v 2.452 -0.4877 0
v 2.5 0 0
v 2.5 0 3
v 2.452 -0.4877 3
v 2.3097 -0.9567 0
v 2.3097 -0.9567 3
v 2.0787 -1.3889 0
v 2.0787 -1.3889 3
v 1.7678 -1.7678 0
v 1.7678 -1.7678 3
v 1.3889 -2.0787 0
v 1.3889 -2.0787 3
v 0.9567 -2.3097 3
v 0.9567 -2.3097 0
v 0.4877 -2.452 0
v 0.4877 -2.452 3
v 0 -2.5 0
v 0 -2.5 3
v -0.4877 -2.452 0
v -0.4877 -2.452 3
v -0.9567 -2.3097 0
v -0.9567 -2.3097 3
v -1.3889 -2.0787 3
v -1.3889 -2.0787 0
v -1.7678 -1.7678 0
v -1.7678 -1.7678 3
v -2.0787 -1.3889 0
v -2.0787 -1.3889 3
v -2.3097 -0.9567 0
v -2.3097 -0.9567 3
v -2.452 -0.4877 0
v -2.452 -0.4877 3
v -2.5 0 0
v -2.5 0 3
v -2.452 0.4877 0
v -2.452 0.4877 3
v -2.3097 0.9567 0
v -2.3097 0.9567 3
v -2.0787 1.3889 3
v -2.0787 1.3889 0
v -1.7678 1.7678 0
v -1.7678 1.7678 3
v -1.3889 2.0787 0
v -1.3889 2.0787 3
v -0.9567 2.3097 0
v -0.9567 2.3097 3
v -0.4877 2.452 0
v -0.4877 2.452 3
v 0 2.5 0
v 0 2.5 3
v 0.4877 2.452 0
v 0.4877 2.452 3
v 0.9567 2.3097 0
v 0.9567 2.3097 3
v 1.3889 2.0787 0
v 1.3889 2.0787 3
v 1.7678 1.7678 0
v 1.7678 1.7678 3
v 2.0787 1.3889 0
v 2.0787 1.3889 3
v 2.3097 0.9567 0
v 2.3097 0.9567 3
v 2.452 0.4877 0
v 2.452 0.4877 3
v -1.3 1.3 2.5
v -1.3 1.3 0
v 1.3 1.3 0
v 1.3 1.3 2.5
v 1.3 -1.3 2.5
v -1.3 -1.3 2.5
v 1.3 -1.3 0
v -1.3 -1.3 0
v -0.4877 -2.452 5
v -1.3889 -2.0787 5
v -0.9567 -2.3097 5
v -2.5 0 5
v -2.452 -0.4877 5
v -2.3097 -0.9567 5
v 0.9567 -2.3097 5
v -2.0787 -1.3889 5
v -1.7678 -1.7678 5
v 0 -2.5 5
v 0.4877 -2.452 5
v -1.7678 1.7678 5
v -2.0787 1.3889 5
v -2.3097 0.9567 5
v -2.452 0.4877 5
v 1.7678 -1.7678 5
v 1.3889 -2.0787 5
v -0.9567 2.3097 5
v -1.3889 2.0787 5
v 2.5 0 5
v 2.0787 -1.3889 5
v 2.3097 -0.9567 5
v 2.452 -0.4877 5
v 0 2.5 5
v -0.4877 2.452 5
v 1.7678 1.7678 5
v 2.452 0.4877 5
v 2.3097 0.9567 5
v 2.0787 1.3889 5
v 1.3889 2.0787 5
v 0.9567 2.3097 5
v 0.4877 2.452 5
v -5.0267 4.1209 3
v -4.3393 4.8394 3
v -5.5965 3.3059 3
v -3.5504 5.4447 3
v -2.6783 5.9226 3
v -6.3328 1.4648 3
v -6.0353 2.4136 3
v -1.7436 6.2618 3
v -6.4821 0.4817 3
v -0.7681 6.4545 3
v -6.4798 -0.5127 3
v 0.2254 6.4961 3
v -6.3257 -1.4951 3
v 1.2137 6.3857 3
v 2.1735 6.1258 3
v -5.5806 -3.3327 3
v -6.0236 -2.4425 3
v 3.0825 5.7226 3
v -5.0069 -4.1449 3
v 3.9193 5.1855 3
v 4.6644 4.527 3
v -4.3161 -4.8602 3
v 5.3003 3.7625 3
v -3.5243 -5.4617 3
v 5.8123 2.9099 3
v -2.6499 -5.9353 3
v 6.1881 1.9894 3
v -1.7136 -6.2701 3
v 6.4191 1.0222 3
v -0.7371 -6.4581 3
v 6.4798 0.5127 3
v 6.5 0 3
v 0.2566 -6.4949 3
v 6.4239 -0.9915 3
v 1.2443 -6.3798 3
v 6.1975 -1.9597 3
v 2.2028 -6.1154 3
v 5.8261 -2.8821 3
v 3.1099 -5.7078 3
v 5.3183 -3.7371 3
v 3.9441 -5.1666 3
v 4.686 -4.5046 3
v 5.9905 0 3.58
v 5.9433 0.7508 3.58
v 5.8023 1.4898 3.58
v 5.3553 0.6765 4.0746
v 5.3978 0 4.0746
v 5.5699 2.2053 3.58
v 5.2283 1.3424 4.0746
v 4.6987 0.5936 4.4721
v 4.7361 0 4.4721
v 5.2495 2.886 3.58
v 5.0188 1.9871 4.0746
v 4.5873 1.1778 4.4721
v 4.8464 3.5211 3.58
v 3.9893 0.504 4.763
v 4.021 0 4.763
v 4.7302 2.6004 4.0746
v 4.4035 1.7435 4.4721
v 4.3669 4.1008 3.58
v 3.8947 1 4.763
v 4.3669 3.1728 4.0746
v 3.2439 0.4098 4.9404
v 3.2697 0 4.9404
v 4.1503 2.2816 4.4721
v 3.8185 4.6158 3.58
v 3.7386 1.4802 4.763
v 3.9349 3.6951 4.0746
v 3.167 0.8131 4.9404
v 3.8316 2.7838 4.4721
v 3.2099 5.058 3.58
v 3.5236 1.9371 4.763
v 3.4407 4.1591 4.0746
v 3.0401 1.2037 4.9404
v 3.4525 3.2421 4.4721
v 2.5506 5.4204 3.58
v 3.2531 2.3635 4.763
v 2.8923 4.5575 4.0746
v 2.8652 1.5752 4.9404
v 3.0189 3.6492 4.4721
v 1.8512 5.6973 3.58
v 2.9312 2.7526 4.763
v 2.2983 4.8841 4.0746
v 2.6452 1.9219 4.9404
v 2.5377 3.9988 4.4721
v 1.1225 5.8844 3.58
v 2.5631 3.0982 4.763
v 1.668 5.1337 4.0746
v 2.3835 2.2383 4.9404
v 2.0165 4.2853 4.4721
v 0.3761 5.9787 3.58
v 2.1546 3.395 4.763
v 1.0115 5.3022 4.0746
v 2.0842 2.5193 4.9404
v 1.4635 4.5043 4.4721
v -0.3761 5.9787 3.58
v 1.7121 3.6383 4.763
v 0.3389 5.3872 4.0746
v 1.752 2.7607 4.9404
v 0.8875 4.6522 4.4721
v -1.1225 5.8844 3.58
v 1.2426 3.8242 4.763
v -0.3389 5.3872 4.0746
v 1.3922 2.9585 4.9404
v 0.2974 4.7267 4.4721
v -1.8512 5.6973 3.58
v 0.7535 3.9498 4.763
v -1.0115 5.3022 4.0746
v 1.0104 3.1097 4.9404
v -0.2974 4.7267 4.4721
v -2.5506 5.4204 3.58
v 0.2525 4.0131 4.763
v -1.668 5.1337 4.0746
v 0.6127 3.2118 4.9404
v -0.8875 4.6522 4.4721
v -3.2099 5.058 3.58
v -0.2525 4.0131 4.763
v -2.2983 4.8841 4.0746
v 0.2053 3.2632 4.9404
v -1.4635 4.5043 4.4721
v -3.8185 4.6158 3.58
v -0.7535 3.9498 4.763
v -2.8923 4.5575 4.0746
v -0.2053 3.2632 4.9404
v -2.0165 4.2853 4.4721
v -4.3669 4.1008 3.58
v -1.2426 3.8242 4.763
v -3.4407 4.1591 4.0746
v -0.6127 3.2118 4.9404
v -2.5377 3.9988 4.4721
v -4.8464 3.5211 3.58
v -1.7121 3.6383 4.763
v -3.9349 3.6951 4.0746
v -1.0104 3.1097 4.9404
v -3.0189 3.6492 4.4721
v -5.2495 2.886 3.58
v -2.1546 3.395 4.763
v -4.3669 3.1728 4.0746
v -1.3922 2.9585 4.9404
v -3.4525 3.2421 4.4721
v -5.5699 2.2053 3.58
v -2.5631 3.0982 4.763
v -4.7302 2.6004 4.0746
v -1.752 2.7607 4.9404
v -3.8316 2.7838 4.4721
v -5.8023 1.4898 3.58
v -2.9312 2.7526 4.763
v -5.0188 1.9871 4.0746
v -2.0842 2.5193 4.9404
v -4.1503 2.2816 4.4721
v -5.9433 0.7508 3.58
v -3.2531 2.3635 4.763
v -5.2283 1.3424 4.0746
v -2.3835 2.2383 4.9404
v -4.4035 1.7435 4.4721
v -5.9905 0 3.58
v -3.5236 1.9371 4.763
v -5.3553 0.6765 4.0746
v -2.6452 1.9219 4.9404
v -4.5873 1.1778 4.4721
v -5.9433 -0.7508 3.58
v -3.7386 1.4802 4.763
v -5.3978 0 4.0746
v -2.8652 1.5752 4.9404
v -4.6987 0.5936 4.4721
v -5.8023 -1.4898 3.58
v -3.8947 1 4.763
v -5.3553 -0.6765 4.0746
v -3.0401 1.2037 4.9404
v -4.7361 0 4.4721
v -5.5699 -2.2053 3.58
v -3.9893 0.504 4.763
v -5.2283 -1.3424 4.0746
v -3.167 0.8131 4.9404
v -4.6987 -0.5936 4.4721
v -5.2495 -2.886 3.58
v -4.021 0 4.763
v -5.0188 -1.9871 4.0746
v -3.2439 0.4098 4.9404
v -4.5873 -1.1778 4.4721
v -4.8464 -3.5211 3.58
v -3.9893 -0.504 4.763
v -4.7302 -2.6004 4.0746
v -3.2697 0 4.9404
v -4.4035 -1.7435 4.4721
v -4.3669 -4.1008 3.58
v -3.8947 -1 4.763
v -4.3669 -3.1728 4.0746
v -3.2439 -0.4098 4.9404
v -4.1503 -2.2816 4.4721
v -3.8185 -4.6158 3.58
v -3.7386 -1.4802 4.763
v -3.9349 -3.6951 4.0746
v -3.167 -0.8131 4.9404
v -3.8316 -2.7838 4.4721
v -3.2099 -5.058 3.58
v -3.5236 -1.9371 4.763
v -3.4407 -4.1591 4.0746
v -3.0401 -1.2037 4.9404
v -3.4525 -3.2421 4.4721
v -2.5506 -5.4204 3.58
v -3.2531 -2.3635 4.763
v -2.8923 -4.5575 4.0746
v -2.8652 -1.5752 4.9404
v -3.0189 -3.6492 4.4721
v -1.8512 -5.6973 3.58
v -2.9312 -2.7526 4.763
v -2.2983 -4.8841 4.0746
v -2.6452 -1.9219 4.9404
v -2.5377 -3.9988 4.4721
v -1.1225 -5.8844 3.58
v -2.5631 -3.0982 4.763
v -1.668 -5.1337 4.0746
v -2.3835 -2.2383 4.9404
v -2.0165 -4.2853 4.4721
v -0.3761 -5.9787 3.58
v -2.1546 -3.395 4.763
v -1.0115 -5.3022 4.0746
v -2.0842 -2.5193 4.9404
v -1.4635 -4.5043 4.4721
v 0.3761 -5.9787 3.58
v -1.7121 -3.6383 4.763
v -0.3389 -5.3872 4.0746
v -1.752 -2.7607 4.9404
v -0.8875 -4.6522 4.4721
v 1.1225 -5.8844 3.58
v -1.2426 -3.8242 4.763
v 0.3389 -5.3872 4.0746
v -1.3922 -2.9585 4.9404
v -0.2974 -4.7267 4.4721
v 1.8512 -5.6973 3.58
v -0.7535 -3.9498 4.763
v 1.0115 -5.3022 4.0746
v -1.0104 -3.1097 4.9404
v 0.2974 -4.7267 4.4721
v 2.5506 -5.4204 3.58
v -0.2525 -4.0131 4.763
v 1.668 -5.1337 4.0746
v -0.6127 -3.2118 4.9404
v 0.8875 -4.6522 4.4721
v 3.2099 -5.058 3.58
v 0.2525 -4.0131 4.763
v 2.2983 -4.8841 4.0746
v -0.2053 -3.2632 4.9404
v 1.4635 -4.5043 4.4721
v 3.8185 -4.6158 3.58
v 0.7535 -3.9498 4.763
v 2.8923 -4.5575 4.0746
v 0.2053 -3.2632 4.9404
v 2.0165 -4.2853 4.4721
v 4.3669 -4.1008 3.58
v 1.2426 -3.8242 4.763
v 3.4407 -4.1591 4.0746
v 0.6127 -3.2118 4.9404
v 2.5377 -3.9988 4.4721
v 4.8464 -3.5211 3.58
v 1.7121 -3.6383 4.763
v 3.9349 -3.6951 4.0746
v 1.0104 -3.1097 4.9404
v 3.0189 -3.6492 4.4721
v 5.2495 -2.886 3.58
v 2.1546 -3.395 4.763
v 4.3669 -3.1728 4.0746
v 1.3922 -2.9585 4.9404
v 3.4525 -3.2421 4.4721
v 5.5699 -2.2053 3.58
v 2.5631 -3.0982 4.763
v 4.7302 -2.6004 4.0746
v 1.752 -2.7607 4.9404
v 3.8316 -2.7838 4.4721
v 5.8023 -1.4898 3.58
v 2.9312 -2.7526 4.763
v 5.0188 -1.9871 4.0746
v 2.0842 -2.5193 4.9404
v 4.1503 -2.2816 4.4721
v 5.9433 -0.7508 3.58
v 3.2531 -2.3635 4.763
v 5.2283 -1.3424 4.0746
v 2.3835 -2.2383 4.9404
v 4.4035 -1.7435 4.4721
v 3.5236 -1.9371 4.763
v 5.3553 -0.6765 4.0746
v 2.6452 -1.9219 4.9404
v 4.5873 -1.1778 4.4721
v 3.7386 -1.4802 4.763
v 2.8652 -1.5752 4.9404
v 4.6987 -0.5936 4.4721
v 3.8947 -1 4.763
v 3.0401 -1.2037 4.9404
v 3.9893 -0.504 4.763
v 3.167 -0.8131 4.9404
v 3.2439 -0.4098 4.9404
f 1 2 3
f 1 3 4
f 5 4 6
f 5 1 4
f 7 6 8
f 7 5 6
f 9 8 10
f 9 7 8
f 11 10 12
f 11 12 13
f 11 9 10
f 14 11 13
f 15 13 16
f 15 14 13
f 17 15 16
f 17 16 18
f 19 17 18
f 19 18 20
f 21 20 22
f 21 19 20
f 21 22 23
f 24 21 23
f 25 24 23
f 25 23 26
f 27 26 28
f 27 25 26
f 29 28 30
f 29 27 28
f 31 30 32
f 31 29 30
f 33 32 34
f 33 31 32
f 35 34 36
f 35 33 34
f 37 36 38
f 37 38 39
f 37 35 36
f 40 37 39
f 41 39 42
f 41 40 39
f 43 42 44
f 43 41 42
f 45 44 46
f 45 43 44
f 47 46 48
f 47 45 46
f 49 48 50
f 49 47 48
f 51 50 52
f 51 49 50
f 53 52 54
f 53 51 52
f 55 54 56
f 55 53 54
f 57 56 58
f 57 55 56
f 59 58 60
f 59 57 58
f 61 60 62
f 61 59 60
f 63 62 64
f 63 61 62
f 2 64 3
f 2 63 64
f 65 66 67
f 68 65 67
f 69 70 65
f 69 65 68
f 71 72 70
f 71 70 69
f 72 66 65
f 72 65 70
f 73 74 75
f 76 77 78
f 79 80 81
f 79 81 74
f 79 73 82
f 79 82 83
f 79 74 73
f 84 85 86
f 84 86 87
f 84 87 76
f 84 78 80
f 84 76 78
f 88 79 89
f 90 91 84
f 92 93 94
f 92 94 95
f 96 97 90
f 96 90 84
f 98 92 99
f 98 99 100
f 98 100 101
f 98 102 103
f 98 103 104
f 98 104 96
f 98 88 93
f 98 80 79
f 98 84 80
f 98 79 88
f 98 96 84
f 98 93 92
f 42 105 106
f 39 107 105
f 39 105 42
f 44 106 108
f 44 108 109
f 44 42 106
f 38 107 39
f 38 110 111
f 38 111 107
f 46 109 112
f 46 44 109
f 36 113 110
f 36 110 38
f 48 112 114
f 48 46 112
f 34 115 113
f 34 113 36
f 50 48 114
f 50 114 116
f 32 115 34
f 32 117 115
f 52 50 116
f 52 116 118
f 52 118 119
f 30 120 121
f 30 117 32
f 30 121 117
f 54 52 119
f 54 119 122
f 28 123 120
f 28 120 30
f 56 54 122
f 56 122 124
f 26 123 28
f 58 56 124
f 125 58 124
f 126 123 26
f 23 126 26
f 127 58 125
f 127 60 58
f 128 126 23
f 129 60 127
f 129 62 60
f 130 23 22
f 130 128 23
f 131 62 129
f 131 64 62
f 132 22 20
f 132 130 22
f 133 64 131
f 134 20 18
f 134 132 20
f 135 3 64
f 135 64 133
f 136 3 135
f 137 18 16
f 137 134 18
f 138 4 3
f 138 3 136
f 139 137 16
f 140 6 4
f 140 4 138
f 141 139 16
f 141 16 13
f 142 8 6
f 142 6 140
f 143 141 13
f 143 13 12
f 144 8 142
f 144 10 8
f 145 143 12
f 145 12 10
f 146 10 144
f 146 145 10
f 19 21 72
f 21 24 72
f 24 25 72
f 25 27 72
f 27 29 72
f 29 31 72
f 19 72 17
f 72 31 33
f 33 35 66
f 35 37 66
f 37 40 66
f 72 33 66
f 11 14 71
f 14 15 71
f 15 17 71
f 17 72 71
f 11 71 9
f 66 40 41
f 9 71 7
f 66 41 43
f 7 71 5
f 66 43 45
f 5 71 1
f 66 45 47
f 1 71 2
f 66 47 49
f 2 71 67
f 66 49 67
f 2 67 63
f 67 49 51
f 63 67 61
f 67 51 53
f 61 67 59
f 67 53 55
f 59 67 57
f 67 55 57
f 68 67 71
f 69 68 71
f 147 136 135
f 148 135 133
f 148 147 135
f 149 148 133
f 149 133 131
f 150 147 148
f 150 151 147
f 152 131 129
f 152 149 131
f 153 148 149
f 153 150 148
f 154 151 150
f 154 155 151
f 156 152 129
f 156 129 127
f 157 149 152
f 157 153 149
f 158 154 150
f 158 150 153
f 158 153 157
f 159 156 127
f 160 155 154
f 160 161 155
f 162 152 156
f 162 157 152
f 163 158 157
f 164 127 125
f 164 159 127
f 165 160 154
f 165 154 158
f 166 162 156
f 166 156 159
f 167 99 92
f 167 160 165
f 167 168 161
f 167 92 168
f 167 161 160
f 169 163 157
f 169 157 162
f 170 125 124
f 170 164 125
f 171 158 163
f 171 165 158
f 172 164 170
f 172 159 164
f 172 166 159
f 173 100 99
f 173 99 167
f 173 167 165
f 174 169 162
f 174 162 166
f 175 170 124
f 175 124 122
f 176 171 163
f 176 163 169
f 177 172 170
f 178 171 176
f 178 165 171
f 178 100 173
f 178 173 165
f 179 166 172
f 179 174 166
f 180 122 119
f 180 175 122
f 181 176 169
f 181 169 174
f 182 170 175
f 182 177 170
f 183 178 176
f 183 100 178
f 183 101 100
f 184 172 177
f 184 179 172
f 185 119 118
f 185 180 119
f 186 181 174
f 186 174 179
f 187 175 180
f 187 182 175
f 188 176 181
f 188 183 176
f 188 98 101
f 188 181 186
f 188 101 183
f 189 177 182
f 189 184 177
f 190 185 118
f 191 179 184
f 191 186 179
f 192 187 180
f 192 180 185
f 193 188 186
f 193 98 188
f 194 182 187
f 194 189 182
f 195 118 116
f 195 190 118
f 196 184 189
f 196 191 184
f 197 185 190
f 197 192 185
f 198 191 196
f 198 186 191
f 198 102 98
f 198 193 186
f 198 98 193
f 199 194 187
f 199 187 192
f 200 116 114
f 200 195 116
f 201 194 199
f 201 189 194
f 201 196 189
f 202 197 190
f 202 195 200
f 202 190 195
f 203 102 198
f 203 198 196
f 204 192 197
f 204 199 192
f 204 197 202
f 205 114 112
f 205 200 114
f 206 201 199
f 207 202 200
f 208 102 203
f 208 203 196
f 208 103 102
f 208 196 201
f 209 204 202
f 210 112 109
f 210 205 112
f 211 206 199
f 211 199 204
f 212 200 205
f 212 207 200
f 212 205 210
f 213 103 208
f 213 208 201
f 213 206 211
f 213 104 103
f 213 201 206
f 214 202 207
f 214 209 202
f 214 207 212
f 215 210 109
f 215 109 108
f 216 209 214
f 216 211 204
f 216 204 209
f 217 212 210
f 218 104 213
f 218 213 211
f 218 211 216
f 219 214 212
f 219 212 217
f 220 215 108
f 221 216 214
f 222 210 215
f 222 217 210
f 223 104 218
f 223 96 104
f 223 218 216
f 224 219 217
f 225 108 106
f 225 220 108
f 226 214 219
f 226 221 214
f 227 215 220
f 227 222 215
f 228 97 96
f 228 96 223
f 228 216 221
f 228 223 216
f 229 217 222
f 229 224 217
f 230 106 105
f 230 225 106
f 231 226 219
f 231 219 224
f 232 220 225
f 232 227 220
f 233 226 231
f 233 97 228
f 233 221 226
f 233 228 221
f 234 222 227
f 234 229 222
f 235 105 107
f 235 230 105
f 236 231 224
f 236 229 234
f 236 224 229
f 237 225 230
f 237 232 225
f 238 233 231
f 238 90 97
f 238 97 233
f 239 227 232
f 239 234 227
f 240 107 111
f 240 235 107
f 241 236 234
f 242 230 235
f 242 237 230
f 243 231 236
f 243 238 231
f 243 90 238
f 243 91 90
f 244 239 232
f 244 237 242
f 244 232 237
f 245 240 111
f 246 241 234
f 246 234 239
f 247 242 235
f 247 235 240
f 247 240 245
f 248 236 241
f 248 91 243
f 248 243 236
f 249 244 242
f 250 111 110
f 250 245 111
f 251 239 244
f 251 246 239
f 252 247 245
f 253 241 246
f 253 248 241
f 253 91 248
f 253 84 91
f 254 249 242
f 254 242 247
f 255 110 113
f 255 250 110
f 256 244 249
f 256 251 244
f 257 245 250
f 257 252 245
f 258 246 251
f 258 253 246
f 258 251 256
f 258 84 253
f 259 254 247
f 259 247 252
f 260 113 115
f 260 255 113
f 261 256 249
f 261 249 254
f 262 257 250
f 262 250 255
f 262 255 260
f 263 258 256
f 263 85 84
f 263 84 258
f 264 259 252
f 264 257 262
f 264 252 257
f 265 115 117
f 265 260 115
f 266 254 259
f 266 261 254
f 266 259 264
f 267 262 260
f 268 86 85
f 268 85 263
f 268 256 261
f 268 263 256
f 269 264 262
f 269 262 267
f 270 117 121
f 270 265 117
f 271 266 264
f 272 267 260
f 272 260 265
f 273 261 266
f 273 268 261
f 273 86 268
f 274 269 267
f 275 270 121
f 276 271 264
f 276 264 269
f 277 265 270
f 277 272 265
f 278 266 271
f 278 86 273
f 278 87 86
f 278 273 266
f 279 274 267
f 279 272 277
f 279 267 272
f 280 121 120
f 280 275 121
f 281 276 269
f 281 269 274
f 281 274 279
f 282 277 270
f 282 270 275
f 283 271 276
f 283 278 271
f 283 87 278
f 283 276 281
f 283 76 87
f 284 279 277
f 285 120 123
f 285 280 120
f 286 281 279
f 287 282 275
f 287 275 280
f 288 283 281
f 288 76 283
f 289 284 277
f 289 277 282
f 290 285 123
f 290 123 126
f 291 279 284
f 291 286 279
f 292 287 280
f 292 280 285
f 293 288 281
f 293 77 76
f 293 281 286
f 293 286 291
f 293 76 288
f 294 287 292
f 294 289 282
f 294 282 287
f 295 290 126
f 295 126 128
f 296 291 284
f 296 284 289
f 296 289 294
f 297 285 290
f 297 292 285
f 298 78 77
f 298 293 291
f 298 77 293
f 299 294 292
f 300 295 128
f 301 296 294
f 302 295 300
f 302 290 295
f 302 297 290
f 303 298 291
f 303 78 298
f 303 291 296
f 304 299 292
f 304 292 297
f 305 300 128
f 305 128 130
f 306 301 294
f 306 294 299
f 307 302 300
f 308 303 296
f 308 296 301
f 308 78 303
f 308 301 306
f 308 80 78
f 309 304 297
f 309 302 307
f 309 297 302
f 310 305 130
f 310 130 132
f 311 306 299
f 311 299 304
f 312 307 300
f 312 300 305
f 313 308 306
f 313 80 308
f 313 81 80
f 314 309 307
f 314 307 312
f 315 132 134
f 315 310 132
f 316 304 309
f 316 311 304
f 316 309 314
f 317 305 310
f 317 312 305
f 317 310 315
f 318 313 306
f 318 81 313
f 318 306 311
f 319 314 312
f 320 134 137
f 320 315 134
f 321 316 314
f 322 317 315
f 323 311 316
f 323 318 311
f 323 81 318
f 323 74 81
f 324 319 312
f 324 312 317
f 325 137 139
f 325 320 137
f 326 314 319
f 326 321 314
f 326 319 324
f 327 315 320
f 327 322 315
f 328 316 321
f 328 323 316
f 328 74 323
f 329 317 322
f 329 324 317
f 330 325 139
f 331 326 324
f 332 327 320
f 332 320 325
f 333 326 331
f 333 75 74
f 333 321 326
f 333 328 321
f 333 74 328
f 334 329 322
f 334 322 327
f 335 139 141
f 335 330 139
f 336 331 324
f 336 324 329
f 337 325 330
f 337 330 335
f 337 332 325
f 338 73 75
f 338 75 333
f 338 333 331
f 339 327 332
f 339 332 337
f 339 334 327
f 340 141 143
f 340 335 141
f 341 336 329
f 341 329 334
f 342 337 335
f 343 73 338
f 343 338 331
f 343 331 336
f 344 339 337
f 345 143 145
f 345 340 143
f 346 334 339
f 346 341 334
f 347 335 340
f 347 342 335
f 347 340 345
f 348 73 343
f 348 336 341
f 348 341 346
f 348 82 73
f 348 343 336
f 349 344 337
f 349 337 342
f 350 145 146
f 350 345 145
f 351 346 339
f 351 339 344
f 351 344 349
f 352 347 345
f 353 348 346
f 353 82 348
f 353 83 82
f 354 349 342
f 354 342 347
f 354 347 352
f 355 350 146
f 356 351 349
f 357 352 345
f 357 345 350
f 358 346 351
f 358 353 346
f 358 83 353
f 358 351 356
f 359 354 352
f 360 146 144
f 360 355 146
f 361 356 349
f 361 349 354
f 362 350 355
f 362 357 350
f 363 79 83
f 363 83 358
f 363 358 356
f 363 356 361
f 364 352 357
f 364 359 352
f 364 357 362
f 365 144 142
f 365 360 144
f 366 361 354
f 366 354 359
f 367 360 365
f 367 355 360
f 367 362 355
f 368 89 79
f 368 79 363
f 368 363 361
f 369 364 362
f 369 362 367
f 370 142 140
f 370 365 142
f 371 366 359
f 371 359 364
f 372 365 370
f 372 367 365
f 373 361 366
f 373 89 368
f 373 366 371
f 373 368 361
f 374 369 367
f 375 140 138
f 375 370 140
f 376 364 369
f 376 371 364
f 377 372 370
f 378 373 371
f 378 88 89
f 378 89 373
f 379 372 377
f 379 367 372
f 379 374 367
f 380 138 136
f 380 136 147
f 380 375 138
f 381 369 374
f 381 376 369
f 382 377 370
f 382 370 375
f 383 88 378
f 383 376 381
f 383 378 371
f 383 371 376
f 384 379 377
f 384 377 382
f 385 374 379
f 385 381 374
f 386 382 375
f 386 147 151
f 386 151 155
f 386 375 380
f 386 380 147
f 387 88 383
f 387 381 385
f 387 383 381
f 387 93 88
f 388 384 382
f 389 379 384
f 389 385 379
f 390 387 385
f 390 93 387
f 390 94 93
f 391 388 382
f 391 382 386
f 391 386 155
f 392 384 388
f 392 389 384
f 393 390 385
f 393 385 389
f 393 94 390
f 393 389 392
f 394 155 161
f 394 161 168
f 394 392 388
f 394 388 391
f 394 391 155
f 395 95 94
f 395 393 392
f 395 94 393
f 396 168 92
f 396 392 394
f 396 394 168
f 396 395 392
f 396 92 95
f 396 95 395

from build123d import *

# Parameters (mm, degrees)
F0_R     = 7.5
F1_DEPTH = 5
F2_R     = 4.99999
F3_W     = 2.6
F3_H     = 2.6
F4_DEPTH = 2.5
F5_R     = 7.5
F5_R_2   = 2.5
F6_DEPTH = 3


# Not quite as in the source:
# - a fillet or chamfer is up to 0.001 mm smaller than in the source, because OpenCascade refuses the exact size


with BuildPart() as f1:
    # F0 (on Top) → F1 (new body)
    with BuildSketch(Plane.XY):
        Circle(F0_R)
    extrude(amount=F1_DEPTH)

    # F2 (radius 5 in the source; OpenCascade refuses exactly that, so slightly less here)
    f2_edges = [f1.edges().sort_by_distance(p)[0] for p in [
        (-7.5, 0, 5),
    ]]
    fillet(f2_edges, radius=F2_R)

    # F3 (on face) → F4 (cut)
    with BuildSketch(Plane(origin=(0, 0, 0), x_dir=(1, 0, 0), z_dir=(0, 0, -1))):
        Rectangle(F3_W, F3_H)
    extrude(amount=-F4_DEPTH, mode=Mode.SUBTRACT)

    # F5 (on face) → F6 (cut)
    with BuildSketch(Plane(origin=(0, 0, 0), x_dir=(1, 0, 0), z_dir=(0, 0, -1))):
        Circle(F5_R)
        Circle(F5_R_2, mode=Mode.SUBTRACT)
    extrude(amount=-F6_DEPTH, mode=Mode.SUBTRACT)


solid = f1.part
